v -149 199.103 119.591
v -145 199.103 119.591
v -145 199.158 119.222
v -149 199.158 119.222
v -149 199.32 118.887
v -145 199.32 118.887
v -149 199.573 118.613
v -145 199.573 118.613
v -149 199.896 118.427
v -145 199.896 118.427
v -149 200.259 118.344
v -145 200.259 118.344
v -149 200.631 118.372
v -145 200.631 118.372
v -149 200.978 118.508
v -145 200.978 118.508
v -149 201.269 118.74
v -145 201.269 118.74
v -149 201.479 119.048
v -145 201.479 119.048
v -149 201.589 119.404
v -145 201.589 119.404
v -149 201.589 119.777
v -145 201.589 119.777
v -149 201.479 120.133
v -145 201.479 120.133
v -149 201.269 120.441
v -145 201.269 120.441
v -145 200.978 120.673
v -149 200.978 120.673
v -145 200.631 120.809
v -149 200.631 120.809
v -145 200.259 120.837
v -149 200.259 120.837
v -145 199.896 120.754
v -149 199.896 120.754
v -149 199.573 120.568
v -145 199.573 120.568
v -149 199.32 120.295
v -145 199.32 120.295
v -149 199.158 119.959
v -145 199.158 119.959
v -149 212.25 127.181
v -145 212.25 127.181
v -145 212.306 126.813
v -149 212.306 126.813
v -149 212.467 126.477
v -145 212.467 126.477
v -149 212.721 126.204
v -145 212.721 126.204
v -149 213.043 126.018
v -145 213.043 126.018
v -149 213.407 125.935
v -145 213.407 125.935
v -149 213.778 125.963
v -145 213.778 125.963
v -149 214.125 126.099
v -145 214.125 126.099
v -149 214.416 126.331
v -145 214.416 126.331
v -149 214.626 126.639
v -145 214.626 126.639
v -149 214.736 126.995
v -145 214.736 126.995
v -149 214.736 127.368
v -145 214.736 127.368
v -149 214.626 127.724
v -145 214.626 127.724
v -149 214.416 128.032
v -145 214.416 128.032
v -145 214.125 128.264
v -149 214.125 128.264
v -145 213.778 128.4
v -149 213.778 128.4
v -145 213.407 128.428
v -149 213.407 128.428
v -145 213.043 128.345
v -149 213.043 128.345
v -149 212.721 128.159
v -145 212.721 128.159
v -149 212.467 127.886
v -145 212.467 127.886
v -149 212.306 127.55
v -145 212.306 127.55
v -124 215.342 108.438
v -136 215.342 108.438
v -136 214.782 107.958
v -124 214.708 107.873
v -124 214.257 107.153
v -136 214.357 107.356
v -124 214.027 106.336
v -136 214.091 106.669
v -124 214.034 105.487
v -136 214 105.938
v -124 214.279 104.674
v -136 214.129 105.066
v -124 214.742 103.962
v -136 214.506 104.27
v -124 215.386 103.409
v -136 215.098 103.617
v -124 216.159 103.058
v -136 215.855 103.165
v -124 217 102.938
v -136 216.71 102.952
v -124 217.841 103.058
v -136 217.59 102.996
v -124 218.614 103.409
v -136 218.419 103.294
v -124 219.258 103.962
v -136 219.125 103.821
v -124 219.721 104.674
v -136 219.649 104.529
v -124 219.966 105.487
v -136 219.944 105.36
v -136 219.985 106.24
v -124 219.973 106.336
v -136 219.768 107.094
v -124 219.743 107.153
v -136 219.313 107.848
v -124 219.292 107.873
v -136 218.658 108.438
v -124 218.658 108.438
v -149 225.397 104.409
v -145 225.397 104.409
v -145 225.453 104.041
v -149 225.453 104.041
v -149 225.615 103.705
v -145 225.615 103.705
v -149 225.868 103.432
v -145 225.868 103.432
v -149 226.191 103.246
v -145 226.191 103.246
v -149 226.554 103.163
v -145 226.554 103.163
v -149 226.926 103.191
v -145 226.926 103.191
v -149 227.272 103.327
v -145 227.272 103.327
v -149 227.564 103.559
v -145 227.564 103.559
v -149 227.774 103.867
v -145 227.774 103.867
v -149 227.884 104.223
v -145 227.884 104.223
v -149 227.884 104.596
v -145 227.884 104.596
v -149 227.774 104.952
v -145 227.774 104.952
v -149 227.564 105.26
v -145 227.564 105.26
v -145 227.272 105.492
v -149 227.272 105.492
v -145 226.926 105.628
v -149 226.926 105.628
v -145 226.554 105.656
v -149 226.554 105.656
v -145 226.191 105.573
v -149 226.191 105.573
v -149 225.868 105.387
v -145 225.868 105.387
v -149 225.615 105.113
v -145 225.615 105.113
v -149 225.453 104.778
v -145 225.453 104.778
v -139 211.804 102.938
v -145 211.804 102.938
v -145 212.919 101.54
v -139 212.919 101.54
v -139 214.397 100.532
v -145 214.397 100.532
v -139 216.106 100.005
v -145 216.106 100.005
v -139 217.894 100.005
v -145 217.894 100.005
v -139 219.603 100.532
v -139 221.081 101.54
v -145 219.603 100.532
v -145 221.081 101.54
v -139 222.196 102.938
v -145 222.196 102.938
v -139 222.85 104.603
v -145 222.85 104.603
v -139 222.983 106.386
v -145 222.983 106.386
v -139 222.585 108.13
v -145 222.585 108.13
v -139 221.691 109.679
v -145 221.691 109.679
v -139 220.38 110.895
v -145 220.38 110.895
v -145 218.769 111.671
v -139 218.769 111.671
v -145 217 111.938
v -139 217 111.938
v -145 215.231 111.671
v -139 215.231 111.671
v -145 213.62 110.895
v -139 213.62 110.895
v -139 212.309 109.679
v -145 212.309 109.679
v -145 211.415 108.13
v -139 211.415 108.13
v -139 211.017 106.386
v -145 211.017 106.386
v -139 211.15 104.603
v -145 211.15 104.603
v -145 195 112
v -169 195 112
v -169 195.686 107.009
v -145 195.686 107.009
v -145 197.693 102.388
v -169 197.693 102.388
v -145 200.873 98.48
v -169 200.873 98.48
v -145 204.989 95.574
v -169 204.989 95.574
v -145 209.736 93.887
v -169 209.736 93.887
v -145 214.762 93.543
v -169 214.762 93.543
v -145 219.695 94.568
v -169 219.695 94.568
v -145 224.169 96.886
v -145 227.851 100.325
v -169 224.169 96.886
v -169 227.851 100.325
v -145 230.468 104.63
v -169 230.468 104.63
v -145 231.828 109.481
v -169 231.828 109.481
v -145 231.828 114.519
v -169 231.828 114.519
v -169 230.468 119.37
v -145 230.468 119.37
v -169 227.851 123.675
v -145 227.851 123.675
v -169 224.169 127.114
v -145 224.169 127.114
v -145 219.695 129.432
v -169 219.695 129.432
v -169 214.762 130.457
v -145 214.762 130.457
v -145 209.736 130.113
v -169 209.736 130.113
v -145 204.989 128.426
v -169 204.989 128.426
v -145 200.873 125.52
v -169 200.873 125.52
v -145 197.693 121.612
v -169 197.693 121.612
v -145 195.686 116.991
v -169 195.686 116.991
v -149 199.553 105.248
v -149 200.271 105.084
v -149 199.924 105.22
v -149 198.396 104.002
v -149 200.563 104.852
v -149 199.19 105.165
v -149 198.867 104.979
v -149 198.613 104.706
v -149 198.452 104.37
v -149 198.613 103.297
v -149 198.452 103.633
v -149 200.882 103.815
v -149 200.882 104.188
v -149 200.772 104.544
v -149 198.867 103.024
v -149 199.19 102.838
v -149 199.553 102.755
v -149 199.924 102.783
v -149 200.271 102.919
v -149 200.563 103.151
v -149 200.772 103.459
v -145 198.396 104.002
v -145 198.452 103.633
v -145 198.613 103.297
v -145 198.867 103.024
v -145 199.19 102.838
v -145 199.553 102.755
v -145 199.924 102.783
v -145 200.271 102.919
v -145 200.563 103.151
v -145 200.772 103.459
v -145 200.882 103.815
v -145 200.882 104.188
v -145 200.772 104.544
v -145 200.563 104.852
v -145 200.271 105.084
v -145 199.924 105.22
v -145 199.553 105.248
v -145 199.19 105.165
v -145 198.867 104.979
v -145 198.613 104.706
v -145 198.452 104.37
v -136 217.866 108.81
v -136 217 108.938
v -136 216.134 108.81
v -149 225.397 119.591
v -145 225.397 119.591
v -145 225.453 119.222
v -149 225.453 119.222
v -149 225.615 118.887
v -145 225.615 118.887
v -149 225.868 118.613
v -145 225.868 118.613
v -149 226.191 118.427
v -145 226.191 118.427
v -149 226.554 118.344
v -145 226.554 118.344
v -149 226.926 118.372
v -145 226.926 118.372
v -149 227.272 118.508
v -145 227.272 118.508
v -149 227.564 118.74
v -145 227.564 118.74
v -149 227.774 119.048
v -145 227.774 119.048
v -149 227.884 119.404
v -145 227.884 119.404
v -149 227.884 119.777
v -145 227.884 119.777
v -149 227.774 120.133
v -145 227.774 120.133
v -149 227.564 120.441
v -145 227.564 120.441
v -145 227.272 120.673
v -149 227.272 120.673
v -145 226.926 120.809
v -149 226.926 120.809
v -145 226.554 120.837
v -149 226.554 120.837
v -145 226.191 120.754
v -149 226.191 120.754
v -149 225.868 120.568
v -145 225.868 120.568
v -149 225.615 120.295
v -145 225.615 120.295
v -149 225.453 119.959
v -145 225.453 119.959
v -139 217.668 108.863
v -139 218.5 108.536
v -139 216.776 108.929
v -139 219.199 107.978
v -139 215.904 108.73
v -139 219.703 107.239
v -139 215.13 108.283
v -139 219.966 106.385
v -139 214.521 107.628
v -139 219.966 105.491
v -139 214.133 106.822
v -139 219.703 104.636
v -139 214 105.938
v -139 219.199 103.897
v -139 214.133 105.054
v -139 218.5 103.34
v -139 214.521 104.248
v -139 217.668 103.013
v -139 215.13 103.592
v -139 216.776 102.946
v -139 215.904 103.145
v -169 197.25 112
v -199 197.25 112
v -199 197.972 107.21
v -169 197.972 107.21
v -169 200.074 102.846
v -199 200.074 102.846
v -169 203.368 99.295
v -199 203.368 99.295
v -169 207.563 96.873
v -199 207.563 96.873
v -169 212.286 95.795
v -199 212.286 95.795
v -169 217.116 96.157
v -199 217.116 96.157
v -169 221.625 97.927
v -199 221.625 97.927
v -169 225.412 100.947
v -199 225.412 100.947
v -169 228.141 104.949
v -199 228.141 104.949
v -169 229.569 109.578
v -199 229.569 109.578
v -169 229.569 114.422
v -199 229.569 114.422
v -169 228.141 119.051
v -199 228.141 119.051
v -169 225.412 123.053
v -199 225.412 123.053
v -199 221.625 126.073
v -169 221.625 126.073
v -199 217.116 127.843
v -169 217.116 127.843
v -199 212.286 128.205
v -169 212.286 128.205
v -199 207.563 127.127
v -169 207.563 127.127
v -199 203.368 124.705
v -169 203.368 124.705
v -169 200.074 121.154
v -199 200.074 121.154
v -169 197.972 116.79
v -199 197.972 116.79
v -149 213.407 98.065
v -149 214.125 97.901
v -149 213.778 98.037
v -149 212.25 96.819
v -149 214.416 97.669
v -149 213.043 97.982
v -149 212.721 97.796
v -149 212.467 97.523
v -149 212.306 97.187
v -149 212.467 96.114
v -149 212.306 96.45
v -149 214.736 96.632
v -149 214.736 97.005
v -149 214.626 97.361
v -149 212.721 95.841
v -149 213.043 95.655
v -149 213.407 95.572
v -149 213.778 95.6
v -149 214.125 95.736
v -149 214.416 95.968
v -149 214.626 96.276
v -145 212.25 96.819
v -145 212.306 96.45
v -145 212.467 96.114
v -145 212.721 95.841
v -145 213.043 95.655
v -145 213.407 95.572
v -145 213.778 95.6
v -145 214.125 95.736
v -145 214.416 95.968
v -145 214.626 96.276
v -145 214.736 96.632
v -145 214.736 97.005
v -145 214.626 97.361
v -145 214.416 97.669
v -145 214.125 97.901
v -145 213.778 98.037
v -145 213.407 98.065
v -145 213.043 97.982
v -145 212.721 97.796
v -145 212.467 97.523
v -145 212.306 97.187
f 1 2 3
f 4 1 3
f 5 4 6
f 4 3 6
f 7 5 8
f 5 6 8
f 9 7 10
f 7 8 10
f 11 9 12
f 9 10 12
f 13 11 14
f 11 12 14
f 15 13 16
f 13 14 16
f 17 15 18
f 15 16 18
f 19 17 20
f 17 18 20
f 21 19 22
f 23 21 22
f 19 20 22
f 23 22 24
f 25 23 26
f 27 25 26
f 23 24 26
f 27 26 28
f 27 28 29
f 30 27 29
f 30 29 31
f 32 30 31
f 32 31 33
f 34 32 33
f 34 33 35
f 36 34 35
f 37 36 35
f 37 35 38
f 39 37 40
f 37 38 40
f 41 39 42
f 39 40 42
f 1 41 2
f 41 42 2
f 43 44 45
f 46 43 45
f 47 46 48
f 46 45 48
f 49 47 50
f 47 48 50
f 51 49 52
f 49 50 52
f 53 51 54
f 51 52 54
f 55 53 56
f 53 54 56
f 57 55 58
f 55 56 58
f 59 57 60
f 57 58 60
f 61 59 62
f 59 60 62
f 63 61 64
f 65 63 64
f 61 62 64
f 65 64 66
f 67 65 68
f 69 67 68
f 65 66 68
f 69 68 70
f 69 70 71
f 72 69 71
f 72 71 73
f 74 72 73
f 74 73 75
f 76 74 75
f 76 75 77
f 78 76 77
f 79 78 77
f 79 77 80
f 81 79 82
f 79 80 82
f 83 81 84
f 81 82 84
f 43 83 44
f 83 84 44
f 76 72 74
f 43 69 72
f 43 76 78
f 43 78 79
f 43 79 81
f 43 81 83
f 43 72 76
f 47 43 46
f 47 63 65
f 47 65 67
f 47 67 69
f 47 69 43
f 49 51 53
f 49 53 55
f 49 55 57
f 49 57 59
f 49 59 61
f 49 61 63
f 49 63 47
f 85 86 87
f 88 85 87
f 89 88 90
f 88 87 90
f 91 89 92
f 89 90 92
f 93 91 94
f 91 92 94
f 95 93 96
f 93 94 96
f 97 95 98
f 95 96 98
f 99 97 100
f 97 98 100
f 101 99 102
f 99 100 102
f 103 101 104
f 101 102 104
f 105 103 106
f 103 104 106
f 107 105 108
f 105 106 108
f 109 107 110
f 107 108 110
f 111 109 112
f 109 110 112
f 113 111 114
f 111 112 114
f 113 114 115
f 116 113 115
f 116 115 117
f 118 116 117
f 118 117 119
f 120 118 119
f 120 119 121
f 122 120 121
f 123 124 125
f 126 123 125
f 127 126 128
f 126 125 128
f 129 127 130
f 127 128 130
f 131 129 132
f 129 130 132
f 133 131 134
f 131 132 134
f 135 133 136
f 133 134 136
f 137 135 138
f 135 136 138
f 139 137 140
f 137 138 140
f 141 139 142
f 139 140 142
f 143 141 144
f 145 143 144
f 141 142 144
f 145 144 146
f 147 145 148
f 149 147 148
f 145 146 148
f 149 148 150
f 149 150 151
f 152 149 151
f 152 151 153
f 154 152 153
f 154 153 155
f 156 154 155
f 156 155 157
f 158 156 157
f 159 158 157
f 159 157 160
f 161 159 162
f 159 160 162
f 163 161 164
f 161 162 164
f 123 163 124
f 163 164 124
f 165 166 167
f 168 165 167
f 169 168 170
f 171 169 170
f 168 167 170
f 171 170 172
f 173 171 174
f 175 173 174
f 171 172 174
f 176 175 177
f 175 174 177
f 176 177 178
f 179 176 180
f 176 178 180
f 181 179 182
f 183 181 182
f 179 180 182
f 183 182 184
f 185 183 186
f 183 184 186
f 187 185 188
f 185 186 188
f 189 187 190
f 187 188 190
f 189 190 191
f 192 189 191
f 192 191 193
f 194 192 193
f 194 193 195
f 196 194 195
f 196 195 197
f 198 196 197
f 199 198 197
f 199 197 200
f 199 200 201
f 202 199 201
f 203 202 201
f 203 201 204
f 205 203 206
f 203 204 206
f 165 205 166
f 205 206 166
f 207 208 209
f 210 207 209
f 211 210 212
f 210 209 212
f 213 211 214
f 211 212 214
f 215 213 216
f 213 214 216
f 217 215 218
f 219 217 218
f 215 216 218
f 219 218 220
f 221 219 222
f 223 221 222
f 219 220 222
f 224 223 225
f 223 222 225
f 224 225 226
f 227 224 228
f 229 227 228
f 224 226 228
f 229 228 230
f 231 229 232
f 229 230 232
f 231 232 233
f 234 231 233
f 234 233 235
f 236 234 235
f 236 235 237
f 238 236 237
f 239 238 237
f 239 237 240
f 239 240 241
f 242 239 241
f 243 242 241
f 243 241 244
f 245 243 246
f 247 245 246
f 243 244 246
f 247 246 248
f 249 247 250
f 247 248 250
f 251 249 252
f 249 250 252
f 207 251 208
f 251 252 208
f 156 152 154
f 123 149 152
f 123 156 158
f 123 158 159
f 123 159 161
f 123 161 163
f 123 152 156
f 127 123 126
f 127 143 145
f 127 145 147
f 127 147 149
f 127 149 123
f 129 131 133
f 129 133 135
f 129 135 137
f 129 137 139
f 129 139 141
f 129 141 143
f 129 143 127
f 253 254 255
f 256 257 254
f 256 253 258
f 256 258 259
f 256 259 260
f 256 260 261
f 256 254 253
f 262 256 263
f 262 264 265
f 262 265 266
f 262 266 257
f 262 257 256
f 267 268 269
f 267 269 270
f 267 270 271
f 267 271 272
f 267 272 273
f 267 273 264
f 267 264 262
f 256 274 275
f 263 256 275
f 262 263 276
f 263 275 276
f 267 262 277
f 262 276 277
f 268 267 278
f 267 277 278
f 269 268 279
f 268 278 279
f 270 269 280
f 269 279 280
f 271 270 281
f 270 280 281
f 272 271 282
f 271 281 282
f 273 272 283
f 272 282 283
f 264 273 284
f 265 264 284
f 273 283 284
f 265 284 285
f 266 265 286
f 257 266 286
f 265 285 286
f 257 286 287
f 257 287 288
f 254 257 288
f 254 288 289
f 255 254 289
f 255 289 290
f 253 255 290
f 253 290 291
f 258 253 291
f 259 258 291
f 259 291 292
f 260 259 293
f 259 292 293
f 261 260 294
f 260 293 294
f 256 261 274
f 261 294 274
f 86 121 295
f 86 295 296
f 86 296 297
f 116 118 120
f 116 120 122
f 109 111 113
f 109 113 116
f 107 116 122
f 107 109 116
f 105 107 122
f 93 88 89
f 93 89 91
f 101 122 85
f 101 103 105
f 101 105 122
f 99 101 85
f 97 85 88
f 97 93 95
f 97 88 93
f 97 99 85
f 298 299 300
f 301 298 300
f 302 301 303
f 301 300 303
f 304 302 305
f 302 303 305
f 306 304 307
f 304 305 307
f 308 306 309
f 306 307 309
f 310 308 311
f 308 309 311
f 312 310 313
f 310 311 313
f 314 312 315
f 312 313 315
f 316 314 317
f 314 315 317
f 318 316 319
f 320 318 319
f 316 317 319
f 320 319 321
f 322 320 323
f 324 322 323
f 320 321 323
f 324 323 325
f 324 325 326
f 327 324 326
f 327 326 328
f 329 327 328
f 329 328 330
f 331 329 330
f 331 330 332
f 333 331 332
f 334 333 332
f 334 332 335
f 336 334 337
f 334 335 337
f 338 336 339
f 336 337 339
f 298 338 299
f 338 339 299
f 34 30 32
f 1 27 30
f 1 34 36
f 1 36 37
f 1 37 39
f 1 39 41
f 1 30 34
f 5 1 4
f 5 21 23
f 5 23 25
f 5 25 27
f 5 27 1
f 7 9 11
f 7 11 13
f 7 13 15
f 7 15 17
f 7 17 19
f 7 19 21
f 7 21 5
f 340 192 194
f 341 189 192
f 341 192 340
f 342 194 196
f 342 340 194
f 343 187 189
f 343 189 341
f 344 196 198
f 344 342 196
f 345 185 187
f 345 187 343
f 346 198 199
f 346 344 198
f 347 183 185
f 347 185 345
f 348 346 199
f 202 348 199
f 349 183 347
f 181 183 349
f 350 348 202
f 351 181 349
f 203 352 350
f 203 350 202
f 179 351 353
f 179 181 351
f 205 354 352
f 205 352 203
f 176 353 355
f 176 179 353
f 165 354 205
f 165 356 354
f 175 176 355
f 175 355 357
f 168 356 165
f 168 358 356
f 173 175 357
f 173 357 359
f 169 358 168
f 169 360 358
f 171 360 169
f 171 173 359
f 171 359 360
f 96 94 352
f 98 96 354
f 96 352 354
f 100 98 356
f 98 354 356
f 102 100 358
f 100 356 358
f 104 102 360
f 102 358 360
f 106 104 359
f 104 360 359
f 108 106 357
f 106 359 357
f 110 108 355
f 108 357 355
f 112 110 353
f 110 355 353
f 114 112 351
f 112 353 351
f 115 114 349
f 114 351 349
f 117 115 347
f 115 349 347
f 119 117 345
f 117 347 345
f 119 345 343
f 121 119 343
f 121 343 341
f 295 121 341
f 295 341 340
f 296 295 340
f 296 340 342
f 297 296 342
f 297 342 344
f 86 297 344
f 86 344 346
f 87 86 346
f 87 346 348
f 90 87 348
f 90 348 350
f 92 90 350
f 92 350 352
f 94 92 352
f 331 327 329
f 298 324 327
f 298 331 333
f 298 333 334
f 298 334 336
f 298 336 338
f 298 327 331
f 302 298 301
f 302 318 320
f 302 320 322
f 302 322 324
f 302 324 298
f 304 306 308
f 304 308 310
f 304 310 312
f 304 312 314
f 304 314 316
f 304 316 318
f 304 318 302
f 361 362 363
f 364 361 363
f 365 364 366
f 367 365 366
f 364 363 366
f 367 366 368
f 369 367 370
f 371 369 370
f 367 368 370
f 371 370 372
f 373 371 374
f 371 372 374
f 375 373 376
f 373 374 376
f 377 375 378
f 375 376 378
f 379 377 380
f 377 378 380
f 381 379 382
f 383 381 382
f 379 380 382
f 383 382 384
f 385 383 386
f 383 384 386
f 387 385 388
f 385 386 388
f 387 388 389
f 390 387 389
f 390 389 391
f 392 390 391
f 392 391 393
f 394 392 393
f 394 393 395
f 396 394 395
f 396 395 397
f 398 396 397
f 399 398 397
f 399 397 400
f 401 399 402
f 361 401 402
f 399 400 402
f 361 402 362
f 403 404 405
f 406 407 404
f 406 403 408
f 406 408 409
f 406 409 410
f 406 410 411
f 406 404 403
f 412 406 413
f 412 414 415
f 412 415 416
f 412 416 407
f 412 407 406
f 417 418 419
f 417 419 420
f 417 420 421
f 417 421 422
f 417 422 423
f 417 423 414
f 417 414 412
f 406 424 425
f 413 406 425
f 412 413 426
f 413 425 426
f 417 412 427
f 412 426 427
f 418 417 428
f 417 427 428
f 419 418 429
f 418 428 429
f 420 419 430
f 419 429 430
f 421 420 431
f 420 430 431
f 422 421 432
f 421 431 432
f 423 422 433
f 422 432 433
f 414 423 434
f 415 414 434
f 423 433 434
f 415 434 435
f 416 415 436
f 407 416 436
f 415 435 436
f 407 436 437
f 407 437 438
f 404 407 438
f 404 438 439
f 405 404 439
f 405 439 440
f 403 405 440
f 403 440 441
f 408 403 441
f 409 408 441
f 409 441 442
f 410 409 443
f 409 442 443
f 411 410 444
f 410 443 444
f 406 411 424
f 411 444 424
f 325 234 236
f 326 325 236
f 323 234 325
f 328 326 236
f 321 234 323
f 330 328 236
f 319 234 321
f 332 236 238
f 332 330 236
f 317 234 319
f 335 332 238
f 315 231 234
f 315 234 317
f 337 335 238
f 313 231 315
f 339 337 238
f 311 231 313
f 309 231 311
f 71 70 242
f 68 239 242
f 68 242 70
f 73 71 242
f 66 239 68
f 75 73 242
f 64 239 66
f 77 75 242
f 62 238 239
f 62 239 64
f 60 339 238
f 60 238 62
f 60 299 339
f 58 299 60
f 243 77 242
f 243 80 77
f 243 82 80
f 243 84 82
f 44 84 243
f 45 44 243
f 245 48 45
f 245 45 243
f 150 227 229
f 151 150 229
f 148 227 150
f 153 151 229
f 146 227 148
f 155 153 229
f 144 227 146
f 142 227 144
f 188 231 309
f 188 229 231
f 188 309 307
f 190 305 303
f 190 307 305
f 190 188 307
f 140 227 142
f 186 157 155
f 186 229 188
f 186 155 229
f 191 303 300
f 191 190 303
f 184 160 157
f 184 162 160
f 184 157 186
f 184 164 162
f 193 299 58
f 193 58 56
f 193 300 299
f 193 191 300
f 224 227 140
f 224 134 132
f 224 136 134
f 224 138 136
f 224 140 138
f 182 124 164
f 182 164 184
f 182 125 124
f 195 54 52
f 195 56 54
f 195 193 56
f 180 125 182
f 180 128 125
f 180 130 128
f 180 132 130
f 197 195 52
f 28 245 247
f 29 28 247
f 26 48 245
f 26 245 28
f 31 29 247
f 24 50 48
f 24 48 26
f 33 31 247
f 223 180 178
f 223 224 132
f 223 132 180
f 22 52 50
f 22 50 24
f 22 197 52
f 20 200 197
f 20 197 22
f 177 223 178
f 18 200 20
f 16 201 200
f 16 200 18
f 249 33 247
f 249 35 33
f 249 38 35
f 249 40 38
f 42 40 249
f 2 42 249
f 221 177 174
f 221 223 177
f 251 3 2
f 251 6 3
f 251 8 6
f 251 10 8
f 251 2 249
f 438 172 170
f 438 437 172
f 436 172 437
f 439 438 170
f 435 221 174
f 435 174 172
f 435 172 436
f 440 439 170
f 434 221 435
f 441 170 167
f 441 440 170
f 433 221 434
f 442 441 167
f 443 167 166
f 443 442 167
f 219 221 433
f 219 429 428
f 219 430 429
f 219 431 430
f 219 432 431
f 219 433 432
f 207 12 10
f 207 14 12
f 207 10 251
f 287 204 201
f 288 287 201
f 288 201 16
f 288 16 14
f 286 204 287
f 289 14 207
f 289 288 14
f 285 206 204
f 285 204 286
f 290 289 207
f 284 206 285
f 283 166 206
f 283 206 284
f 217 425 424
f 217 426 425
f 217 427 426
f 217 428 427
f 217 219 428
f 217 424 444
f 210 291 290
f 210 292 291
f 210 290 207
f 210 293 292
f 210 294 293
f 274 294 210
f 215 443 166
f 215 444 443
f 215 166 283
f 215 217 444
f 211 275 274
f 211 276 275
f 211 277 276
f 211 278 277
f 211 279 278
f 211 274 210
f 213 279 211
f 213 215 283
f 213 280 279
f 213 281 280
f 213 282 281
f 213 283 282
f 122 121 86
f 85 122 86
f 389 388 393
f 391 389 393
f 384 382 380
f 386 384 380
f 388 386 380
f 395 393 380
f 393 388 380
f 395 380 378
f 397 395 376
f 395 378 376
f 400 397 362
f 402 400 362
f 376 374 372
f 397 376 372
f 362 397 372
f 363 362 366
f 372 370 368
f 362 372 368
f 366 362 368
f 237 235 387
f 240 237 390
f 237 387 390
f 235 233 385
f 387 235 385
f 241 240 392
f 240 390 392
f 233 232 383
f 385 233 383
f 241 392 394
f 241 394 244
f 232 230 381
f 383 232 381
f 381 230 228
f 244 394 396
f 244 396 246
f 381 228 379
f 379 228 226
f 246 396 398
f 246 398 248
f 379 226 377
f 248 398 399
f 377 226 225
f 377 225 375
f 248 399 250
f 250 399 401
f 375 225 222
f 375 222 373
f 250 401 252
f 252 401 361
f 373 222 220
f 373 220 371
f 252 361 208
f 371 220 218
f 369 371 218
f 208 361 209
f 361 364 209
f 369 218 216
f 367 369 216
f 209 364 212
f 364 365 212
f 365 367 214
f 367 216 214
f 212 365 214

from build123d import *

# Parameters (mm, degrees)
SKETCH061_R             = 16.25
PAD047_DEPTH            = 30
SKETCH062_R             = 18.5
PAD048_DEPTH            = 24
SKETCH063_R             = 1.25
POCKET012_DEPTH         = 4
SKETCH064_R             = 6
PAD049_DEPTH            = 6
SKETCH065_R             = 3
PAD050_DEPTH            = 3
PAD051_DEPTH            = 12
BODY015_ROLL_ANGLE      = -90
BODY015_PLACEMENT_ANGLE = -90


with BuildPart() as part:
    # Sketch061 → Pad047 (new body)
    with BuildSketch(Plane.XY):
        Circle(SKETCH061_R)
    extrude(amount=PAD047_DEPTH)

    # Sketch062 (on Face3 of Pad047) → Pad048 (join)
    with BuildSketch(Plane.XY.offset(30)):
        Circle(SKETCH062_R)
    extrude(amount=PAD048_DEPTH)

    # Sketch063 (on Face5 of Pad048) → Pocket012 (cut)
    with BuildSketch(Plane.XY.offset(54)):
        with Locations((-13.14747, 7.590696)):
            Circle(SKETCH063_R)
        with Locations((-13.14747, -7.590696)):
            Circle(SKETCH063_R)
        with Locations((13.14747, -7.590696)):
            Circle(SKETCH063_R)
        with Locations((0, 15.181391)):
            Circle(SKETCH063_R)
        with Locations((13.853779, 7.998483)):
            Circle(SKETCH063_R)
        with Locations((0, -15.181391)):
            Circle(SKETCH063_R)
    extrude(amount=-POCKET012_DEPTH, mode=Mode.SUBTRACT)

    # Sketch064 (on Face5 of Pocket012) → Pad049 (join)
    with BuildSketch(Plane(origin=(0, 0, 54), x_dir=(0.866025, 0.5, 0), z_dir=(0, 0, 1))):
        with Locations((0, 7)):
            Circle(SKETCH064_R)
    extrude(amount=PAD049_DEPTH)

    # Sketch065 (on Face17 of Pad049) → Pad050 (join)
    with BuildSketch(Plane.XY.offset(60)):
        with Locations((-3.5, 6.062178)):
            Circle(SKETCH065_R)
    extrude(amount=PAD050_DEPTH)

    # Sketch066 (on Face21 of Pad050) → Pad051 (join)
    with BuildSketch(Plane.XY.offset(63)):
        with BuildLine():
            Line((-5.158312, 3.562178), (-1.841688, 3.562178))
            ThreePointArc((-1.841688, 3.562178), (-3.5, 9.062178), (-5.158312, 3.562178))
        make_face()
    extrude(amount=PAD051_DEPTH)


with BuildPart() as part_1:
    # Body015 roll: moved
    add(part.part.rotate(Axis((0, 0, 0), (1, 0, 0)), BODY015_ROLL_ANGLE))


with BuildPart() as part_2:
    # Body015 placement: moved
    add(part_1.part.moved(Location((-199, 213.5, 112))).rotate(Axis((-199, 213.5, 112), (0, 0, 1)), BODY015_PLACEMENT_ANGLE))


solid = part_2.part
